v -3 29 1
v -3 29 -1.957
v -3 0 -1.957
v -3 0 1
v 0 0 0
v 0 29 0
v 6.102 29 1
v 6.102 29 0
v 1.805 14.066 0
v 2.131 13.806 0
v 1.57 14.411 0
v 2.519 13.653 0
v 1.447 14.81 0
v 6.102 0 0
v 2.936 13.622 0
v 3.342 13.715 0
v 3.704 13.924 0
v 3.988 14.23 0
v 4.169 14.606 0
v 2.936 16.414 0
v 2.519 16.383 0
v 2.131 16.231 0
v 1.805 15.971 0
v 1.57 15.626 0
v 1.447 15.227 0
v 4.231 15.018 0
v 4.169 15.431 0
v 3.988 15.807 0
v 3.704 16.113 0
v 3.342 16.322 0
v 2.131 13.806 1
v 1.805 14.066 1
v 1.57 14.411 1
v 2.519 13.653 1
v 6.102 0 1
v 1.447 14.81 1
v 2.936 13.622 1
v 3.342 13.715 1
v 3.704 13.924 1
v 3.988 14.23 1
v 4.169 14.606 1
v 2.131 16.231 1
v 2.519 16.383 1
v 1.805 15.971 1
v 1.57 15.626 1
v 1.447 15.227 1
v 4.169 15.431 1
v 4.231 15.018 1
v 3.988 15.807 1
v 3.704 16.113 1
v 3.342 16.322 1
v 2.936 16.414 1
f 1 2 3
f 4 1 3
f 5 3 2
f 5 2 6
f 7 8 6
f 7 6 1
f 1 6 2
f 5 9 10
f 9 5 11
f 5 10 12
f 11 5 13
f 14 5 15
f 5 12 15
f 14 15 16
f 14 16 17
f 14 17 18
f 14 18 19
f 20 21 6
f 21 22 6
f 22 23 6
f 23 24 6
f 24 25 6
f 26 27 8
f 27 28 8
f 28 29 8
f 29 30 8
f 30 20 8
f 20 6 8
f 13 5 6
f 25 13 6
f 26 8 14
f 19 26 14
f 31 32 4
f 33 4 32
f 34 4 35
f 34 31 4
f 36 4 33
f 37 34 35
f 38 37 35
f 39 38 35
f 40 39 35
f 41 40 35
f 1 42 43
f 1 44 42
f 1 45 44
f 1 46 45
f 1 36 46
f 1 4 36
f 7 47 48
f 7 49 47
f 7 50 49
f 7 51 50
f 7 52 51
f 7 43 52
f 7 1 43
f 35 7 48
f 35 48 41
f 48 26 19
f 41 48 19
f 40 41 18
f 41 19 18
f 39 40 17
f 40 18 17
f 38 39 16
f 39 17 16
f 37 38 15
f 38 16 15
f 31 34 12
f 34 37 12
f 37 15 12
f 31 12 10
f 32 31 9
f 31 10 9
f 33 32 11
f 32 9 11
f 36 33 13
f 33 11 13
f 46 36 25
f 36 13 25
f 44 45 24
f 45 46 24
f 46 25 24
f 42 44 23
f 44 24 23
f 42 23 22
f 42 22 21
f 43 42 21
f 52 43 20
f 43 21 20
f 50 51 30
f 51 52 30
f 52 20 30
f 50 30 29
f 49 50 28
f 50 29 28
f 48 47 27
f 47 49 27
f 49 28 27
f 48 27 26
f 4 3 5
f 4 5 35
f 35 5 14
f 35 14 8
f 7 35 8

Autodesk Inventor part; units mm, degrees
ref_plane "YZ Plane" through (0, 0, 0) normal (1, 0, 0) x (0, 1, 0)
ref_plane "XZ Plane" through (0, 0, 0) normal (0, 1, 0) x (-1, 0, 0)
ref_plane "XY Plane" through (0, 0, 0) normal (0, 0, 1) x (1, 0, 0)
ref_plane "Work Plane1" through (0, 0, 0) normal (0, 0, 1) x (1, 0, 0)
sketch "Sketch1" plane through (0, 0, 0) normal (0, 0, 1) x (1, 0, 0)
  arc A0 (0, 9.6831) -> (0, 20.3535) centre (0, 15.0183) ccw projected
  line L0 (0, 0) -> (0, 9.6831) projected
  line L1 (6.1022, 0) -> (0, 0) projected
  line L2 (6.1022, 0) -> (6.1022, 29) projected
  line L3 (6.1022, 29) -> (0, 29) projected
  line L4 (0, 20.3535) -> (0, 29) projected
  line L5 (6.1022, 29) -> (-3, 29)
  line L6 (-3, 29) -> (-3, 0)
  line L7 (-3, 0) -> (6.1022, 0)
  line L8 (6.1022, 0) -> (6.1022, 29)
  circle A1 centre (2.8309, 15.0183) radius 1.4 projected
  dimension "d0" = 3
extrude "Extrusion1" add sketch "Sketch1" along normal blind 1
sketch "Sketch2" plane through (-3, 0, 0) normal (0, -1, 0) x (1, 0, 0)
  line L0 (0, 0) -> (9.1022, 0) projected
  line L1 (9.1022, 0) -> (9.1022, 1) projected
  line L2 (0, 1) -> (9.1022, 1) projected
  line L3 (0, 0) -> (0, 1) projected
  line L4 (-3.1221, -0.6) -> (3.4779, -0.6)
  line L5 (9.1022, 0) -> (0, 0) projected
  line L6 (0, 0) -> (3, 0)
  line L7 (0, 0) -> (0, -1.9574)
  line L8 (0, -1.9574) -> (3, 0)
  point P0 (0, -0.6)
extrude "Extrusion2" add sketch "Sketch2" against normal up to surface (29 mm away) contours L0 L8 L4 L7 | L4 L8 L7
properties part number "cellSTORM_v5_chiptry_clamp"
